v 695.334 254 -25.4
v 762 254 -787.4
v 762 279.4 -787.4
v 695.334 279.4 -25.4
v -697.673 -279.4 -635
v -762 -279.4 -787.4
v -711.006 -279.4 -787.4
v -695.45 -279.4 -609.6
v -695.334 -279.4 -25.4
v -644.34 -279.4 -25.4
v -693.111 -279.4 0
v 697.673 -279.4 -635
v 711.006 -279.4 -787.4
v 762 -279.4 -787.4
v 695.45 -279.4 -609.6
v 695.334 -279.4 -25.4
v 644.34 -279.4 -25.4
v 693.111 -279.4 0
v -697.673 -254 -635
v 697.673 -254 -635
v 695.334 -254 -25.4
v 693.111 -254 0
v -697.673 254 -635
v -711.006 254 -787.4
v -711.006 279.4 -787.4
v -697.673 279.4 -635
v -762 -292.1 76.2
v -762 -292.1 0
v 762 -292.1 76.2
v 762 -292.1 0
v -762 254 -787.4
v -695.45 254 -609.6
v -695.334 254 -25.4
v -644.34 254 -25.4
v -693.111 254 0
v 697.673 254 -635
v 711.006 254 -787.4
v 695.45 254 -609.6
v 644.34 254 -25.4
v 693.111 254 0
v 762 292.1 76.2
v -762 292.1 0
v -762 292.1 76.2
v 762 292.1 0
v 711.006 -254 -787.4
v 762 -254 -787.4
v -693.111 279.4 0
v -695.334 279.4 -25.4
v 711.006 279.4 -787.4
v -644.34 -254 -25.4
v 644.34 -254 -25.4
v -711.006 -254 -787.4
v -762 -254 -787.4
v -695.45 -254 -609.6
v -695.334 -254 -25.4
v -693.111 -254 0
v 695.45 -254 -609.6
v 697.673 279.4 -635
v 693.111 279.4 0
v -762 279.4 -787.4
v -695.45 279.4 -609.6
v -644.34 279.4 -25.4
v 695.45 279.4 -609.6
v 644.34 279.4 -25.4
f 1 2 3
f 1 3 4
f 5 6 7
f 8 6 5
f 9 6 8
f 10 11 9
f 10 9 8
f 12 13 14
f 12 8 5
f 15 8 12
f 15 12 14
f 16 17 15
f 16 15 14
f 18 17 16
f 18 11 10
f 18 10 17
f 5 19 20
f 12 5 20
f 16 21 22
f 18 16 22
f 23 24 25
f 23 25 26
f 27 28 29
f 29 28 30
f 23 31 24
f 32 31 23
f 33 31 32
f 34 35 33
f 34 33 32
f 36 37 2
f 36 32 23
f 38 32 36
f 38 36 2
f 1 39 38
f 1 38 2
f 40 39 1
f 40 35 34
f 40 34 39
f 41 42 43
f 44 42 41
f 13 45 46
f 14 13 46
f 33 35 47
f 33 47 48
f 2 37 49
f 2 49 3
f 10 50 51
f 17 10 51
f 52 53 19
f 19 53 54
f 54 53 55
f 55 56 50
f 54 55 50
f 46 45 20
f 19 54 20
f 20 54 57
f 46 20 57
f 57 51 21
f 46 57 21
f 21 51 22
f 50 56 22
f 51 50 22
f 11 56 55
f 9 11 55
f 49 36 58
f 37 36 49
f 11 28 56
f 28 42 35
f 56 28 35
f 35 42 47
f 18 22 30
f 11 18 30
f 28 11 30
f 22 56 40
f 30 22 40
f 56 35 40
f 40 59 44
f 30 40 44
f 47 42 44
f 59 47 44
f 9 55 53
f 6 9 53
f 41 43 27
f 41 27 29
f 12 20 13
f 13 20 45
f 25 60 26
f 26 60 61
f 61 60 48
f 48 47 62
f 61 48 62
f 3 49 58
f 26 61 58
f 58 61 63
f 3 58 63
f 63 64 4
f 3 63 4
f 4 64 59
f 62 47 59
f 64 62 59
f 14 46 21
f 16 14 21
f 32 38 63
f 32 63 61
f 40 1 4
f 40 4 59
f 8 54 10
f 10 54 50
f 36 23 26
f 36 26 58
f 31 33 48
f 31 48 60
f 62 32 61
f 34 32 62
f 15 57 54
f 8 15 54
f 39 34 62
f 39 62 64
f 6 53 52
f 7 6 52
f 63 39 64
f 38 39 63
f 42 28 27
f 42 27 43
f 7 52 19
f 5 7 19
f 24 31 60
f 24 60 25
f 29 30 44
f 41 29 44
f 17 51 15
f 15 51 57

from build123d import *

# Parameters (mm, degrees)
F0_W     = 1524
F0_H     = 584.2
F1_DEPTH = 76.2
F5_DEPTH = 25.4


with BuildPart() as f1:
    # F0 (on Top) → F1 (new body)
    with BuildSketch(Plane.XY):
        Rectangle(F0_W, F0_H)
    extrude(amount=F1_DEPTH)

    # F4 (on offset) → F5 (join)
    with BuildSketch(Plane.XZ.offset(254)):
        Polygon((-644.339591, -25.4), (-695.333638, -25.4), (-762, -787.4), (-711.005952, -787.4), (-697.67268, -635), (-695.450468, -609.6), align=None)
        Polygon((762, -787.4), (695.333638, -25.4), (644.339591, -25.4), (695.450468, -609.6), (697.67268, -635), (711.005952, -787.4), align=None)
        Polygon((693.111426, 0), (-693.111426, 0), (-695.333638, -25.4), (-644.339591, -25.4), (644.339591, -25.4), (695.333638, -25.4), align=None)
        Polygon((695.450468, -609.6), (-695.450468, -609.6), (-697.67268, -635), (697.67268, -635), align=None)
    extrude(amount=F5_DEPTH)

    # F6: F1 across plane


with BuildPart() as f1_1:
    add(f1.part)
    add(f1.part.mirror(Plane.XZ))


solid = f1_1.part
